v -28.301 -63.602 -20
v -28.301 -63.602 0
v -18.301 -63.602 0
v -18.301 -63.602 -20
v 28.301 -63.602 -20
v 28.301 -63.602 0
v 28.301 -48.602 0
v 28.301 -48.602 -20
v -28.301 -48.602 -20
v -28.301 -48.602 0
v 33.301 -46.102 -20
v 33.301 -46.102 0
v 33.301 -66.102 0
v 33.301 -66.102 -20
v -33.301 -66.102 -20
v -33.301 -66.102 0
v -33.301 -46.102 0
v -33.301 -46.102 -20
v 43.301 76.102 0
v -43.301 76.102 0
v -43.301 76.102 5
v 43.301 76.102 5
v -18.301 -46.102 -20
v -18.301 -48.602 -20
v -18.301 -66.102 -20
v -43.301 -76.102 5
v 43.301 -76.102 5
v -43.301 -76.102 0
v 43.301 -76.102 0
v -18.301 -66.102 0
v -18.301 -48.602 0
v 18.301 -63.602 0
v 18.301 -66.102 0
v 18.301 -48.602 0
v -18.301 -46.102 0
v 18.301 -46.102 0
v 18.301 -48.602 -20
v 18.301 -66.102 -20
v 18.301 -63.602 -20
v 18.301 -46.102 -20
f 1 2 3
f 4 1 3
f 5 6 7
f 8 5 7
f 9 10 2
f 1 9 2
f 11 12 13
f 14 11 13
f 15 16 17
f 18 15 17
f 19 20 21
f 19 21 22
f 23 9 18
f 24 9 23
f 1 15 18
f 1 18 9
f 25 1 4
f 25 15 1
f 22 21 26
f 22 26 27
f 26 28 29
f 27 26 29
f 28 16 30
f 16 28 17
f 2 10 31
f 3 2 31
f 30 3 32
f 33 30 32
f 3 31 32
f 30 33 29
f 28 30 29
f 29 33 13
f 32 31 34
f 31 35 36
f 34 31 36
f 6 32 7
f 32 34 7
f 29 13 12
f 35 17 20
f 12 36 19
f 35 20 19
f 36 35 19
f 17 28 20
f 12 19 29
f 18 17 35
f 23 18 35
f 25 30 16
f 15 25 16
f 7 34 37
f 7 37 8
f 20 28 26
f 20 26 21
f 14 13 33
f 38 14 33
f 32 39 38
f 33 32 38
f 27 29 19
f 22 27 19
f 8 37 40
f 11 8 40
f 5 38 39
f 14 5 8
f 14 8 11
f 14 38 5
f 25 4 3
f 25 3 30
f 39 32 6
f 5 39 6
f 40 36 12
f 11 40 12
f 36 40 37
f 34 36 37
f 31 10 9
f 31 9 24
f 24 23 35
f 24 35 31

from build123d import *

# Parameters (mm, degrees)
F0_W     = 86.602568
F0_H     = 152.204066
F1_DEPTH = 5
F2_W     = 10
F2_H     = 2.5
F3_DEPTH = 20


with BuildPart() as f1:
    # F0 (on Top) → F1 (new body)
    with BuildSketch(Plane.XY):
        Rectangle(F0_W, F0_H)
    extrude(amount=F1_DEPTH)

    # F2 (on face) → F3 (join)
    with BuildSketch(Plane(origin=(0, 0, 0), x_dir=(1, 0, 0), z_dir=(0, 0, -1))):
        Polygon((-28.301284, 66.102033), (-33.301284, 66.102033), (-33.301284, 46.102033), (-28.301284, 46.102033), (-28.301284, 48.602033), (-28.301284, 63.602033), align=None)
        with Locations((-23.301284, 64.852033)):
            Rectangle(F2_W, F2_H)
        with Locations((-23.301284, 47.352033)):
            Rectangle(F2_W, F2_H)
        Polygon((28.301284, 48.602033), (28.301284, 46.102033), (33.301284, 46.102033), (33.301284, 66.102033), (28.301284, 66.102033), (28.301284, 63.602033), align=None)
        with Locations((23.301284, 47.352033)):
            Rectangle(F2_W, F2_H)
        with Locations((23.301284, 64.852033)):
            Rectangle(F2_W, F2_H)
    extrude(amount=F3_DEPTH)


solid = f1.part
